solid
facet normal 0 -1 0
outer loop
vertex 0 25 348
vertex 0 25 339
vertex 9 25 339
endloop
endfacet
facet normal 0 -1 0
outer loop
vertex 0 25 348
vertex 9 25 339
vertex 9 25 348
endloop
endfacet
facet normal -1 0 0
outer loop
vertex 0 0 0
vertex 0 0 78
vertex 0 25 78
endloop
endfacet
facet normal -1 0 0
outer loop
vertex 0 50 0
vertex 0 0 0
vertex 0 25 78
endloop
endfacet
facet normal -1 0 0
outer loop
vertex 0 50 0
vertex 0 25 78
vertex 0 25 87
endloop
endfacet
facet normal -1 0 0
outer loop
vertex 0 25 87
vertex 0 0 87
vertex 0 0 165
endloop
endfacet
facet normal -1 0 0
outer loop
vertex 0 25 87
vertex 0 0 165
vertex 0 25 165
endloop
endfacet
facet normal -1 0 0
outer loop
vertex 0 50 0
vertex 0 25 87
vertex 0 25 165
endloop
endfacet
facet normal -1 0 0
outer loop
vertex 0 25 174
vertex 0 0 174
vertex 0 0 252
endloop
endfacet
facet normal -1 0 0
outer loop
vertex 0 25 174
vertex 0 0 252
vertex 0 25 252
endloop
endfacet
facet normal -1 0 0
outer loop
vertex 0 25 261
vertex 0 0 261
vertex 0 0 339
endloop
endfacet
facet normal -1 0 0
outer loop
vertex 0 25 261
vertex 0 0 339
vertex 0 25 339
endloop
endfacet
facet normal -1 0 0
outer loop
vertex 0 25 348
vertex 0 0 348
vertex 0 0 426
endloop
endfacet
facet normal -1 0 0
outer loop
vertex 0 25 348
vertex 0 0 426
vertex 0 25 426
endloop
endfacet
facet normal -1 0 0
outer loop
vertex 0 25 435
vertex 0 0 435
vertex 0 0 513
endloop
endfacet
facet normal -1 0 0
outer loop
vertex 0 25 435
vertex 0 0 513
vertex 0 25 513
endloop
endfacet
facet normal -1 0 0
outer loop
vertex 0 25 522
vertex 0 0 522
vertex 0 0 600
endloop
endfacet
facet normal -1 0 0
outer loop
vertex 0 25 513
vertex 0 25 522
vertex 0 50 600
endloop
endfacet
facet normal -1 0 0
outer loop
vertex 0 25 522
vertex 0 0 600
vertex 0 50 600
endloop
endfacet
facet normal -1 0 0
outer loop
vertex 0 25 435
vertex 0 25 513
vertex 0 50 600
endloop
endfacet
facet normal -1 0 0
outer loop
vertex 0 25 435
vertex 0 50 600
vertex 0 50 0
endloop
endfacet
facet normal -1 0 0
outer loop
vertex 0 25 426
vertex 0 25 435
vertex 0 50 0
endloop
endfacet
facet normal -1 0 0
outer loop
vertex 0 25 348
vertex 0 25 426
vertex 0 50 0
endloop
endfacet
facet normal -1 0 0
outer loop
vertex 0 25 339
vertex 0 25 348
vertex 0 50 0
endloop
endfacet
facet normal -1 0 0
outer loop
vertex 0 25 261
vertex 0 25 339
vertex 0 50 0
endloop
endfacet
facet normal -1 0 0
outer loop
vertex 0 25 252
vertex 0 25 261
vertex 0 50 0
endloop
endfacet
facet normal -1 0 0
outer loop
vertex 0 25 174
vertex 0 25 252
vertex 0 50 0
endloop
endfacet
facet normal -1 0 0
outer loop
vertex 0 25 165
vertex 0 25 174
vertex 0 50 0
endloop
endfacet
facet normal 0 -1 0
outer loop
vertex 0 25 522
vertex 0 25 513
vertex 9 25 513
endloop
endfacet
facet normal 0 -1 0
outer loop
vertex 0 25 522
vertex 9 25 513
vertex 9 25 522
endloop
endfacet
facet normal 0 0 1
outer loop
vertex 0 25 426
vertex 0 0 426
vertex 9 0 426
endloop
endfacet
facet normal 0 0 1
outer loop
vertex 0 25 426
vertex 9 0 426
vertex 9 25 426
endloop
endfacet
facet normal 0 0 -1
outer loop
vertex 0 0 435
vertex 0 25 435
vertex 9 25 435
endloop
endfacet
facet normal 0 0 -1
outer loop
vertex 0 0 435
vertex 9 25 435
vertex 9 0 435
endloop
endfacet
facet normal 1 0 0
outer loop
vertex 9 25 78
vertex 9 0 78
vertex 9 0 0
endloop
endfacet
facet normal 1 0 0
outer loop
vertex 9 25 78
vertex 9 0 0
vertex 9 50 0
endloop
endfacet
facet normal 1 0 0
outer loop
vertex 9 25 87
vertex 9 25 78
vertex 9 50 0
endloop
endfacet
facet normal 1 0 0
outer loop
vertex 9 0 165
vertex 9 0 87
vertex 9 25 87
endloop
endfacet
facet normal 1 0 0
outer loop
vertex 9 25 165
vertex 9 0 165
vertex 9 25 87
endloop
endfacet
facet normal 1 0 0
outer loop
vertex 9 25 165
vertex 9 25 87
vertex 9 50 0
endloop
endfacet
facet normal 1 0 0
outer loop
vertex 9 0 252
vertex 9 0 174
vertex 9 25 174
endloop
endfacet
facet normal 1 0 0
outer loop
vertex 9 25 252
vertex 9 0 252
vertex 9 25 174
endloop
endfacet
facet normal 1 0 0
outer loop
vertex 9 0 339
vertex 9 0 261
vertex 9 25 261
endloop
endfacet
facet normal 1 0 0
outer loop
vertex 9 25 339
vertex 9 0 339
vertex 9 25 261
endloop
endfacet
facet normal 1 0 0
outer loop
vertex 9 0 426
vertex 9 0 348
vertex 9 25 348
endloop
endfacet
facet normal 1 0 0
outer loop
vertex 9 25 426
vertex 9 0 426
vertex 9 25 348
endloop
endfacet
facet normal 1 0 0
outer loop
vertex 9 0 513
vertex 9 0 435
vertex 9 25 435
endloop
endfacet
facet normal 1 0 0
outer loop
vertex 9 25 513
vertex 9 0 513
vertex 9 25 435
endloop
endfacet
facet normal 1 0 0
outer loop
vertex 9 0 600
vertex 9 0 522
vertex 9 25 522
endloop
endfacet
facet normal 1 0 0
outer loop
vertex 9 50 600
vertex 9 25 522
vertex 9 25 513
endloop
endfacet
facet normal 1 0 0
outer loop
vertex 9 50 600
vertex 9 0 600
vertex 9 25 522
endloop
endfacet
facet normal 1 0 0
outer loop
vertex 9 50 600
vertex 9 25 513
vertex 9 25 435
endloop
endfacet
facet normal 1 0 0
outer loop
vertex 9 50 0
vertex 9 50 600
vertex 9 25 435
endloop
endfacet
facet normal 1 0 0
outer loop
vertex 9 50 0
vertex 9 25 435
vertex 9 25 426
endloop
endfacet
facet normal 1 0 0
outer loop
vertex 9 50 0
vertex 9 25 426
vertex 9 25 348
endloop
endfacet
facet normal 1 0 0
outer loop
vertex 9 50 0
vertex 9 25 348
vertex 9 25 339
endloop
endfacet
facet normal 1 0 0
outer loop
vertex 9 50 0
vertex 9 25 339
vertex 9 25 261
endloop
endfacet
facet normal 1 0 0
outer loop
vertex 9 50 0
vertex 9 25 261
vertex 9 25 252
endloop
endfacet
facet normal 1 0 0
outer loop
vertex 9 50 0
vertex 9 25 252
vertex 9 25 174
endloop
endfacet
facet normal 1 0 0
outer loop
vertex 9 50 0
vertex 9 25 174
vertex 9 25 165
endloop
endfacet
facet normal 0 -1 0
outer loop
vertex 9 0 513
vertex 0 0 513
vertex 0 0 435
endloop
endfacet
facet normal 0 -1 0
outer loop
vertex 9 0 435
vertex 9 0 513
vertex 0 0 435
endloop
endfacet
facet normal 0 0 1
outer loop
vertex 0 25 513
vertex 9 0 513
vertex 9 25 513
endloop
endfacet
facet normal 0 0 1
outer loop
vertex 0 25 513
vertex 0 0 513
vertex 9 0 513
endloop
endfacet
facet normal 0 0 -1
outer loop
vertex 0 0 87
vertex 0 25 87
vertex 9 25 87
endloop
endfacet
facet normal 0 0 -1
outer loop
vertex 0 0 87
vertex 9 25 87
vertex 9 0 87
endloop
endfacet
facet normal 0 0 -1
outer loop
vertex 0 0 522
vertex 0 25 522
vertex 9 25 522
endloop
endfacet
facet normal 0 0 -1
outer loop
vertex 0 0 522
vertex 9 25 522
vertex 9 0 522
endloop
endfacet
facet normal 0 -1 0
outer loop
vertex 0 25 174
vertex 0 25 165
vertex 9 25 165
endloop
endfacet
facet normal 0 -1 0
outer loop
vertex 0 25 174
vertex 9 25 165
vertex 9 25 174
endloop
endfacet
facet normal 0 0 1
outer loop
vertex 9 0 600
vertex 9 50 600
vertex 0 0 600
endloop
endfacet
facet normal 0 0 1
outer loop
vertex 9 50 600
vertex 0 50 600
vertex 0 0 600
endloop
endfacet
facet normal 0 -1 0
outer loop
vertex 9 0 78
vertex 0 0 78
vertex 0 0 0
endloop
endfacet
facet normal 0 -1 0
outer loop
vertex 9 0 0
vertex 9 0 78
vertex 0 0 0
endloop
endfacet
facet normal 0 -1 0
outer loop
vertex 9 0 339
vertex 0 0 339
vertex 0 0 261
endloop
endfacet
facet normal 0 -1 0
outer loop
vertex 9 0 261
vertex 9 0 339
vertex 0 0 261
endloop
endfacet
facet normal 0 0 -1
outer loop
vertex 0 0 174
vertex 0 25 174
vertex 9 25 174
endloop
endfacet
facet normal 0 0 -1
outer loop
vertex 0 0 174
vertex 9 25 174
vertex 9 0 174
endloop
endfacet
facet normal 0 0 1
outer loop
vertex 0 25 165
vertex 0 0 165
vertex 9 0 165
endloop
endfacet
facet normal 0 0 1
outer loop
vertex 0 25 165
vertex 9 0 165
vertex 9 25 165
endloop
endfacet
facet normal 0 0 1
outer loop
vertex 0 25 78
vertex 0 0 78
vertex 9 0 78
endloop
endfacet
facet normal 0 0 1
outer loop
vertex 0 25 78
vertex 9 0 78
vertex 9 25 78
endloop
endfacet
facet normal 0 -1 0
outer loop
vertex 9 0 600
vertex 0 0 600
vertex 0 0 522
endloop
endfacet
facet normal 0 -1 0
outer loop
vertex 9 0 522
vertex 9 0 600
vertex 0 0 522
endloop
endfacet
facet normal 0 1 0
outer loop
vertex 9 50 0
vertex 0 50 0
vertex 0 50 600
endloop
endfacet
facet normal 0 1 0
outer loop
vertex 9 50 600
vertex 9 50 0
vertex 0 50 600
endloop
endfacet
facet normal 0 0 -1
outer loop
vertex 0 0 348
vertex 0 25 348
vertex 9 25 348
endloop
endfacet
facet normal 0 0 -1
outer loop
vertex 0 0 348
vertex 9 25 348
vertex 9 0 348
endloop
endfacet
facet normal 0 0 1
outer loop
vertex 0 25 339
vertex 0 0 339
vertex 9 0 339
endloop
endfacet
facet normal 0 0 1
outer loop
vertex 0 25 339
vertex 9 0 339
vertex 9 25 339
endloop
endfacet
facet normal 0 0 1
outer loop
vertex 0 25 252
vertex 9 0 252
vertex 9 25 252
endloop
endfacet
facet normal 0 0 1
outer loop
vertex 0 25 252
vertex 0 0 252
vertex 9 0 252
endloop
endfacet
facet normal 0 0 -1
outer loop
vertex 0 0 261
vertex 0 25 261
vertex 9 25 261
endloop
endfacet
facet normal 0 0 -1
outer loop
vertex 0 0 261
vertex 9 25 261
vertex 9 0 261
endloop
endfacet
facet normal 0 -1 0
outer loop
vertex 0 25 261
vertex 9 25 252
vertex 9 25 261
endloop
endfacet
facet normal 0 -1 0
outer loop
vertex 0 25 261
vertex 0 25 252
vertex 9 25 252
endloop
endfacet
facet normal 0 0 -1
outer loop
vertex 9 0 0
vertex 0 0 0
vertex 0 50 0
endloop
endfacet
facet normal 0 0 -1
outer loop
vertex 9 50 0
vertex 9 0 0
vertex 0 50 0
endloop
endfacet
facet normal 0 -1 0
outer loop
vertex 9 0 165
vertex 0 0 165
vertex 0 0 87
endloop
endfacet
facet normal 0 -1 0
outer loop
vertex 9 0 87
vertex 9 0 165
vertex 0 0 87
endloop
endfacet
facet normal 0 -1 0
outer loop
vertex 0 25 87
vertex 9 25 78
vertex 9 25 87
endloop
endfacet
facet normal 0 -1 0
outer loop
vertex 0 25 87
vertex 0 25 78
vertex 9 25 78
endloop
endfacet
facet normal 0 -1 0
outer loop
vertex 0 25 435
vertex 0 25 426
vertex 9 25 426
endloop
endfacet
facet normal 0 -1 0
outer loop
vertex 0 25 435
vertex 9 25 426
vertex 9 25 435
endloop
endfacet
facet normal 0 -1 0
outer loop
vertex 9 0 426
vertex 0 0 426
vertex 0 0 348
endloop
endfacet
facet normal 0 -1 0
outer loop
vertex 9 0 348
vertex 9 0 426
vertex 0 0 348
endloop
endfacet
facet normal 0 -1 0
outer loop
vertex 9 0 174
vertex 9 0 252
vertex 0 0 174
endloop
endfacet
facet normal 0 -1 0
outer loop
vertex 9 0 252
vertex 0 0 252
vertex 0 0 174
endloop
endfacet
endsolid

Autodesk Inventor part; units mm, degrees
ref_plane "YZ Plane" through (0, 0, 0) normal (1, 0, 0) x (0, 1, 0)
ref_plane "XZ Plane" through (0, 0, 0) normal (0, 1, 0) x (-1, 0, 0)
ref_plane "XY Plane" through (0, 0, 0) normal (0, 0, 1) x (1, 0, 0)
sketch "Sketch1" plane through (0, 0, 0) normal (1, 0, 0) x (0, 1, 0)
  line L0 (0, 0) -> (50, 0)
  line L1 (50, 0) -> (50, 600)
  line L2 (50, 600) -> (0, 600)
  line L3 (0, 600) -> (0, 0)
  line L4 (0, 78) -> (25, 78)
  line L5 (25, 78) -> (25, 87)
  line L6 (25, 87) -> (0, 87)
  line L7 (0, 87) -> (0, 78)
  line L8 (0, 165) -> (25, 165)
  line L9 (25, 165) -> (25, 174)
  line L10 (25, 174) -> (0, 174)
  line L11 (0, 174) -> (0, 165)
  line L12 (0, 252) -> (25, 252)
  line L13 (25, 252) -> (25, 261)
  line L14 (25, 261) -> (0, 261)
  line L15 (0, 261) -> (0, 252)
  line L16 (0, 339) -> (25, 339)
  line L17 (25, 339) -> (25, 348)
  line L18 (25, 348) -> (0, 348)
  line L19 (0, 348) -> (0, 339)
  line L20 (0, 426) -> (25, 426)
  line L21 (25, 426) -> (25, 435)
  line L22 (25, 435) -> (0, 435)
  line L23 (0, 435) -> (0, 426)
  line L24 (0, 513) -> (25, 513)
  line L25 (25, 513) -> (25, 522)
  line L26 (25, 522) -> (0, 522)
  line L27 (0, 522) -> (0, 513)
  dimension "d0" = 50
  dimension "d1" = 600
  dimension "d4" = 9
  dimension "d5" = 25
  dimension "d6" = 78
  dimension "d7" = 9
  dimension "d8" = 25
  dimension "d9" = 9
  dimension "d10" = 25
  dimension "d11" = 9
  dimension "d12" = 25
  dimension "d13" = 9
  dimension "d14" = 25
  dimension "d15" = 9
  dimension "d16" = 25
  dimension "d17" = 78
  dimension "d18" = 78
  dimension "d19" = 78
  dimension "d20" = 78
  dimension "d21" = 78
extrude "Extrusion2" add sketch "Sketch1" along normal blind 9 contours L3 L4 L5 L6 L8 L9 L10 L12 L13 L14 L16 L17 L18 L20 L21 L22 L24 L25 L26 L2 L1 L0
equation "\"d17\" = d6"
equation "\"d18\" = d6"
equation "\"d19\" = d6"
equation "\"d20\" = d6"
equation "\"d21\" = d6"
properties part number "leg"
